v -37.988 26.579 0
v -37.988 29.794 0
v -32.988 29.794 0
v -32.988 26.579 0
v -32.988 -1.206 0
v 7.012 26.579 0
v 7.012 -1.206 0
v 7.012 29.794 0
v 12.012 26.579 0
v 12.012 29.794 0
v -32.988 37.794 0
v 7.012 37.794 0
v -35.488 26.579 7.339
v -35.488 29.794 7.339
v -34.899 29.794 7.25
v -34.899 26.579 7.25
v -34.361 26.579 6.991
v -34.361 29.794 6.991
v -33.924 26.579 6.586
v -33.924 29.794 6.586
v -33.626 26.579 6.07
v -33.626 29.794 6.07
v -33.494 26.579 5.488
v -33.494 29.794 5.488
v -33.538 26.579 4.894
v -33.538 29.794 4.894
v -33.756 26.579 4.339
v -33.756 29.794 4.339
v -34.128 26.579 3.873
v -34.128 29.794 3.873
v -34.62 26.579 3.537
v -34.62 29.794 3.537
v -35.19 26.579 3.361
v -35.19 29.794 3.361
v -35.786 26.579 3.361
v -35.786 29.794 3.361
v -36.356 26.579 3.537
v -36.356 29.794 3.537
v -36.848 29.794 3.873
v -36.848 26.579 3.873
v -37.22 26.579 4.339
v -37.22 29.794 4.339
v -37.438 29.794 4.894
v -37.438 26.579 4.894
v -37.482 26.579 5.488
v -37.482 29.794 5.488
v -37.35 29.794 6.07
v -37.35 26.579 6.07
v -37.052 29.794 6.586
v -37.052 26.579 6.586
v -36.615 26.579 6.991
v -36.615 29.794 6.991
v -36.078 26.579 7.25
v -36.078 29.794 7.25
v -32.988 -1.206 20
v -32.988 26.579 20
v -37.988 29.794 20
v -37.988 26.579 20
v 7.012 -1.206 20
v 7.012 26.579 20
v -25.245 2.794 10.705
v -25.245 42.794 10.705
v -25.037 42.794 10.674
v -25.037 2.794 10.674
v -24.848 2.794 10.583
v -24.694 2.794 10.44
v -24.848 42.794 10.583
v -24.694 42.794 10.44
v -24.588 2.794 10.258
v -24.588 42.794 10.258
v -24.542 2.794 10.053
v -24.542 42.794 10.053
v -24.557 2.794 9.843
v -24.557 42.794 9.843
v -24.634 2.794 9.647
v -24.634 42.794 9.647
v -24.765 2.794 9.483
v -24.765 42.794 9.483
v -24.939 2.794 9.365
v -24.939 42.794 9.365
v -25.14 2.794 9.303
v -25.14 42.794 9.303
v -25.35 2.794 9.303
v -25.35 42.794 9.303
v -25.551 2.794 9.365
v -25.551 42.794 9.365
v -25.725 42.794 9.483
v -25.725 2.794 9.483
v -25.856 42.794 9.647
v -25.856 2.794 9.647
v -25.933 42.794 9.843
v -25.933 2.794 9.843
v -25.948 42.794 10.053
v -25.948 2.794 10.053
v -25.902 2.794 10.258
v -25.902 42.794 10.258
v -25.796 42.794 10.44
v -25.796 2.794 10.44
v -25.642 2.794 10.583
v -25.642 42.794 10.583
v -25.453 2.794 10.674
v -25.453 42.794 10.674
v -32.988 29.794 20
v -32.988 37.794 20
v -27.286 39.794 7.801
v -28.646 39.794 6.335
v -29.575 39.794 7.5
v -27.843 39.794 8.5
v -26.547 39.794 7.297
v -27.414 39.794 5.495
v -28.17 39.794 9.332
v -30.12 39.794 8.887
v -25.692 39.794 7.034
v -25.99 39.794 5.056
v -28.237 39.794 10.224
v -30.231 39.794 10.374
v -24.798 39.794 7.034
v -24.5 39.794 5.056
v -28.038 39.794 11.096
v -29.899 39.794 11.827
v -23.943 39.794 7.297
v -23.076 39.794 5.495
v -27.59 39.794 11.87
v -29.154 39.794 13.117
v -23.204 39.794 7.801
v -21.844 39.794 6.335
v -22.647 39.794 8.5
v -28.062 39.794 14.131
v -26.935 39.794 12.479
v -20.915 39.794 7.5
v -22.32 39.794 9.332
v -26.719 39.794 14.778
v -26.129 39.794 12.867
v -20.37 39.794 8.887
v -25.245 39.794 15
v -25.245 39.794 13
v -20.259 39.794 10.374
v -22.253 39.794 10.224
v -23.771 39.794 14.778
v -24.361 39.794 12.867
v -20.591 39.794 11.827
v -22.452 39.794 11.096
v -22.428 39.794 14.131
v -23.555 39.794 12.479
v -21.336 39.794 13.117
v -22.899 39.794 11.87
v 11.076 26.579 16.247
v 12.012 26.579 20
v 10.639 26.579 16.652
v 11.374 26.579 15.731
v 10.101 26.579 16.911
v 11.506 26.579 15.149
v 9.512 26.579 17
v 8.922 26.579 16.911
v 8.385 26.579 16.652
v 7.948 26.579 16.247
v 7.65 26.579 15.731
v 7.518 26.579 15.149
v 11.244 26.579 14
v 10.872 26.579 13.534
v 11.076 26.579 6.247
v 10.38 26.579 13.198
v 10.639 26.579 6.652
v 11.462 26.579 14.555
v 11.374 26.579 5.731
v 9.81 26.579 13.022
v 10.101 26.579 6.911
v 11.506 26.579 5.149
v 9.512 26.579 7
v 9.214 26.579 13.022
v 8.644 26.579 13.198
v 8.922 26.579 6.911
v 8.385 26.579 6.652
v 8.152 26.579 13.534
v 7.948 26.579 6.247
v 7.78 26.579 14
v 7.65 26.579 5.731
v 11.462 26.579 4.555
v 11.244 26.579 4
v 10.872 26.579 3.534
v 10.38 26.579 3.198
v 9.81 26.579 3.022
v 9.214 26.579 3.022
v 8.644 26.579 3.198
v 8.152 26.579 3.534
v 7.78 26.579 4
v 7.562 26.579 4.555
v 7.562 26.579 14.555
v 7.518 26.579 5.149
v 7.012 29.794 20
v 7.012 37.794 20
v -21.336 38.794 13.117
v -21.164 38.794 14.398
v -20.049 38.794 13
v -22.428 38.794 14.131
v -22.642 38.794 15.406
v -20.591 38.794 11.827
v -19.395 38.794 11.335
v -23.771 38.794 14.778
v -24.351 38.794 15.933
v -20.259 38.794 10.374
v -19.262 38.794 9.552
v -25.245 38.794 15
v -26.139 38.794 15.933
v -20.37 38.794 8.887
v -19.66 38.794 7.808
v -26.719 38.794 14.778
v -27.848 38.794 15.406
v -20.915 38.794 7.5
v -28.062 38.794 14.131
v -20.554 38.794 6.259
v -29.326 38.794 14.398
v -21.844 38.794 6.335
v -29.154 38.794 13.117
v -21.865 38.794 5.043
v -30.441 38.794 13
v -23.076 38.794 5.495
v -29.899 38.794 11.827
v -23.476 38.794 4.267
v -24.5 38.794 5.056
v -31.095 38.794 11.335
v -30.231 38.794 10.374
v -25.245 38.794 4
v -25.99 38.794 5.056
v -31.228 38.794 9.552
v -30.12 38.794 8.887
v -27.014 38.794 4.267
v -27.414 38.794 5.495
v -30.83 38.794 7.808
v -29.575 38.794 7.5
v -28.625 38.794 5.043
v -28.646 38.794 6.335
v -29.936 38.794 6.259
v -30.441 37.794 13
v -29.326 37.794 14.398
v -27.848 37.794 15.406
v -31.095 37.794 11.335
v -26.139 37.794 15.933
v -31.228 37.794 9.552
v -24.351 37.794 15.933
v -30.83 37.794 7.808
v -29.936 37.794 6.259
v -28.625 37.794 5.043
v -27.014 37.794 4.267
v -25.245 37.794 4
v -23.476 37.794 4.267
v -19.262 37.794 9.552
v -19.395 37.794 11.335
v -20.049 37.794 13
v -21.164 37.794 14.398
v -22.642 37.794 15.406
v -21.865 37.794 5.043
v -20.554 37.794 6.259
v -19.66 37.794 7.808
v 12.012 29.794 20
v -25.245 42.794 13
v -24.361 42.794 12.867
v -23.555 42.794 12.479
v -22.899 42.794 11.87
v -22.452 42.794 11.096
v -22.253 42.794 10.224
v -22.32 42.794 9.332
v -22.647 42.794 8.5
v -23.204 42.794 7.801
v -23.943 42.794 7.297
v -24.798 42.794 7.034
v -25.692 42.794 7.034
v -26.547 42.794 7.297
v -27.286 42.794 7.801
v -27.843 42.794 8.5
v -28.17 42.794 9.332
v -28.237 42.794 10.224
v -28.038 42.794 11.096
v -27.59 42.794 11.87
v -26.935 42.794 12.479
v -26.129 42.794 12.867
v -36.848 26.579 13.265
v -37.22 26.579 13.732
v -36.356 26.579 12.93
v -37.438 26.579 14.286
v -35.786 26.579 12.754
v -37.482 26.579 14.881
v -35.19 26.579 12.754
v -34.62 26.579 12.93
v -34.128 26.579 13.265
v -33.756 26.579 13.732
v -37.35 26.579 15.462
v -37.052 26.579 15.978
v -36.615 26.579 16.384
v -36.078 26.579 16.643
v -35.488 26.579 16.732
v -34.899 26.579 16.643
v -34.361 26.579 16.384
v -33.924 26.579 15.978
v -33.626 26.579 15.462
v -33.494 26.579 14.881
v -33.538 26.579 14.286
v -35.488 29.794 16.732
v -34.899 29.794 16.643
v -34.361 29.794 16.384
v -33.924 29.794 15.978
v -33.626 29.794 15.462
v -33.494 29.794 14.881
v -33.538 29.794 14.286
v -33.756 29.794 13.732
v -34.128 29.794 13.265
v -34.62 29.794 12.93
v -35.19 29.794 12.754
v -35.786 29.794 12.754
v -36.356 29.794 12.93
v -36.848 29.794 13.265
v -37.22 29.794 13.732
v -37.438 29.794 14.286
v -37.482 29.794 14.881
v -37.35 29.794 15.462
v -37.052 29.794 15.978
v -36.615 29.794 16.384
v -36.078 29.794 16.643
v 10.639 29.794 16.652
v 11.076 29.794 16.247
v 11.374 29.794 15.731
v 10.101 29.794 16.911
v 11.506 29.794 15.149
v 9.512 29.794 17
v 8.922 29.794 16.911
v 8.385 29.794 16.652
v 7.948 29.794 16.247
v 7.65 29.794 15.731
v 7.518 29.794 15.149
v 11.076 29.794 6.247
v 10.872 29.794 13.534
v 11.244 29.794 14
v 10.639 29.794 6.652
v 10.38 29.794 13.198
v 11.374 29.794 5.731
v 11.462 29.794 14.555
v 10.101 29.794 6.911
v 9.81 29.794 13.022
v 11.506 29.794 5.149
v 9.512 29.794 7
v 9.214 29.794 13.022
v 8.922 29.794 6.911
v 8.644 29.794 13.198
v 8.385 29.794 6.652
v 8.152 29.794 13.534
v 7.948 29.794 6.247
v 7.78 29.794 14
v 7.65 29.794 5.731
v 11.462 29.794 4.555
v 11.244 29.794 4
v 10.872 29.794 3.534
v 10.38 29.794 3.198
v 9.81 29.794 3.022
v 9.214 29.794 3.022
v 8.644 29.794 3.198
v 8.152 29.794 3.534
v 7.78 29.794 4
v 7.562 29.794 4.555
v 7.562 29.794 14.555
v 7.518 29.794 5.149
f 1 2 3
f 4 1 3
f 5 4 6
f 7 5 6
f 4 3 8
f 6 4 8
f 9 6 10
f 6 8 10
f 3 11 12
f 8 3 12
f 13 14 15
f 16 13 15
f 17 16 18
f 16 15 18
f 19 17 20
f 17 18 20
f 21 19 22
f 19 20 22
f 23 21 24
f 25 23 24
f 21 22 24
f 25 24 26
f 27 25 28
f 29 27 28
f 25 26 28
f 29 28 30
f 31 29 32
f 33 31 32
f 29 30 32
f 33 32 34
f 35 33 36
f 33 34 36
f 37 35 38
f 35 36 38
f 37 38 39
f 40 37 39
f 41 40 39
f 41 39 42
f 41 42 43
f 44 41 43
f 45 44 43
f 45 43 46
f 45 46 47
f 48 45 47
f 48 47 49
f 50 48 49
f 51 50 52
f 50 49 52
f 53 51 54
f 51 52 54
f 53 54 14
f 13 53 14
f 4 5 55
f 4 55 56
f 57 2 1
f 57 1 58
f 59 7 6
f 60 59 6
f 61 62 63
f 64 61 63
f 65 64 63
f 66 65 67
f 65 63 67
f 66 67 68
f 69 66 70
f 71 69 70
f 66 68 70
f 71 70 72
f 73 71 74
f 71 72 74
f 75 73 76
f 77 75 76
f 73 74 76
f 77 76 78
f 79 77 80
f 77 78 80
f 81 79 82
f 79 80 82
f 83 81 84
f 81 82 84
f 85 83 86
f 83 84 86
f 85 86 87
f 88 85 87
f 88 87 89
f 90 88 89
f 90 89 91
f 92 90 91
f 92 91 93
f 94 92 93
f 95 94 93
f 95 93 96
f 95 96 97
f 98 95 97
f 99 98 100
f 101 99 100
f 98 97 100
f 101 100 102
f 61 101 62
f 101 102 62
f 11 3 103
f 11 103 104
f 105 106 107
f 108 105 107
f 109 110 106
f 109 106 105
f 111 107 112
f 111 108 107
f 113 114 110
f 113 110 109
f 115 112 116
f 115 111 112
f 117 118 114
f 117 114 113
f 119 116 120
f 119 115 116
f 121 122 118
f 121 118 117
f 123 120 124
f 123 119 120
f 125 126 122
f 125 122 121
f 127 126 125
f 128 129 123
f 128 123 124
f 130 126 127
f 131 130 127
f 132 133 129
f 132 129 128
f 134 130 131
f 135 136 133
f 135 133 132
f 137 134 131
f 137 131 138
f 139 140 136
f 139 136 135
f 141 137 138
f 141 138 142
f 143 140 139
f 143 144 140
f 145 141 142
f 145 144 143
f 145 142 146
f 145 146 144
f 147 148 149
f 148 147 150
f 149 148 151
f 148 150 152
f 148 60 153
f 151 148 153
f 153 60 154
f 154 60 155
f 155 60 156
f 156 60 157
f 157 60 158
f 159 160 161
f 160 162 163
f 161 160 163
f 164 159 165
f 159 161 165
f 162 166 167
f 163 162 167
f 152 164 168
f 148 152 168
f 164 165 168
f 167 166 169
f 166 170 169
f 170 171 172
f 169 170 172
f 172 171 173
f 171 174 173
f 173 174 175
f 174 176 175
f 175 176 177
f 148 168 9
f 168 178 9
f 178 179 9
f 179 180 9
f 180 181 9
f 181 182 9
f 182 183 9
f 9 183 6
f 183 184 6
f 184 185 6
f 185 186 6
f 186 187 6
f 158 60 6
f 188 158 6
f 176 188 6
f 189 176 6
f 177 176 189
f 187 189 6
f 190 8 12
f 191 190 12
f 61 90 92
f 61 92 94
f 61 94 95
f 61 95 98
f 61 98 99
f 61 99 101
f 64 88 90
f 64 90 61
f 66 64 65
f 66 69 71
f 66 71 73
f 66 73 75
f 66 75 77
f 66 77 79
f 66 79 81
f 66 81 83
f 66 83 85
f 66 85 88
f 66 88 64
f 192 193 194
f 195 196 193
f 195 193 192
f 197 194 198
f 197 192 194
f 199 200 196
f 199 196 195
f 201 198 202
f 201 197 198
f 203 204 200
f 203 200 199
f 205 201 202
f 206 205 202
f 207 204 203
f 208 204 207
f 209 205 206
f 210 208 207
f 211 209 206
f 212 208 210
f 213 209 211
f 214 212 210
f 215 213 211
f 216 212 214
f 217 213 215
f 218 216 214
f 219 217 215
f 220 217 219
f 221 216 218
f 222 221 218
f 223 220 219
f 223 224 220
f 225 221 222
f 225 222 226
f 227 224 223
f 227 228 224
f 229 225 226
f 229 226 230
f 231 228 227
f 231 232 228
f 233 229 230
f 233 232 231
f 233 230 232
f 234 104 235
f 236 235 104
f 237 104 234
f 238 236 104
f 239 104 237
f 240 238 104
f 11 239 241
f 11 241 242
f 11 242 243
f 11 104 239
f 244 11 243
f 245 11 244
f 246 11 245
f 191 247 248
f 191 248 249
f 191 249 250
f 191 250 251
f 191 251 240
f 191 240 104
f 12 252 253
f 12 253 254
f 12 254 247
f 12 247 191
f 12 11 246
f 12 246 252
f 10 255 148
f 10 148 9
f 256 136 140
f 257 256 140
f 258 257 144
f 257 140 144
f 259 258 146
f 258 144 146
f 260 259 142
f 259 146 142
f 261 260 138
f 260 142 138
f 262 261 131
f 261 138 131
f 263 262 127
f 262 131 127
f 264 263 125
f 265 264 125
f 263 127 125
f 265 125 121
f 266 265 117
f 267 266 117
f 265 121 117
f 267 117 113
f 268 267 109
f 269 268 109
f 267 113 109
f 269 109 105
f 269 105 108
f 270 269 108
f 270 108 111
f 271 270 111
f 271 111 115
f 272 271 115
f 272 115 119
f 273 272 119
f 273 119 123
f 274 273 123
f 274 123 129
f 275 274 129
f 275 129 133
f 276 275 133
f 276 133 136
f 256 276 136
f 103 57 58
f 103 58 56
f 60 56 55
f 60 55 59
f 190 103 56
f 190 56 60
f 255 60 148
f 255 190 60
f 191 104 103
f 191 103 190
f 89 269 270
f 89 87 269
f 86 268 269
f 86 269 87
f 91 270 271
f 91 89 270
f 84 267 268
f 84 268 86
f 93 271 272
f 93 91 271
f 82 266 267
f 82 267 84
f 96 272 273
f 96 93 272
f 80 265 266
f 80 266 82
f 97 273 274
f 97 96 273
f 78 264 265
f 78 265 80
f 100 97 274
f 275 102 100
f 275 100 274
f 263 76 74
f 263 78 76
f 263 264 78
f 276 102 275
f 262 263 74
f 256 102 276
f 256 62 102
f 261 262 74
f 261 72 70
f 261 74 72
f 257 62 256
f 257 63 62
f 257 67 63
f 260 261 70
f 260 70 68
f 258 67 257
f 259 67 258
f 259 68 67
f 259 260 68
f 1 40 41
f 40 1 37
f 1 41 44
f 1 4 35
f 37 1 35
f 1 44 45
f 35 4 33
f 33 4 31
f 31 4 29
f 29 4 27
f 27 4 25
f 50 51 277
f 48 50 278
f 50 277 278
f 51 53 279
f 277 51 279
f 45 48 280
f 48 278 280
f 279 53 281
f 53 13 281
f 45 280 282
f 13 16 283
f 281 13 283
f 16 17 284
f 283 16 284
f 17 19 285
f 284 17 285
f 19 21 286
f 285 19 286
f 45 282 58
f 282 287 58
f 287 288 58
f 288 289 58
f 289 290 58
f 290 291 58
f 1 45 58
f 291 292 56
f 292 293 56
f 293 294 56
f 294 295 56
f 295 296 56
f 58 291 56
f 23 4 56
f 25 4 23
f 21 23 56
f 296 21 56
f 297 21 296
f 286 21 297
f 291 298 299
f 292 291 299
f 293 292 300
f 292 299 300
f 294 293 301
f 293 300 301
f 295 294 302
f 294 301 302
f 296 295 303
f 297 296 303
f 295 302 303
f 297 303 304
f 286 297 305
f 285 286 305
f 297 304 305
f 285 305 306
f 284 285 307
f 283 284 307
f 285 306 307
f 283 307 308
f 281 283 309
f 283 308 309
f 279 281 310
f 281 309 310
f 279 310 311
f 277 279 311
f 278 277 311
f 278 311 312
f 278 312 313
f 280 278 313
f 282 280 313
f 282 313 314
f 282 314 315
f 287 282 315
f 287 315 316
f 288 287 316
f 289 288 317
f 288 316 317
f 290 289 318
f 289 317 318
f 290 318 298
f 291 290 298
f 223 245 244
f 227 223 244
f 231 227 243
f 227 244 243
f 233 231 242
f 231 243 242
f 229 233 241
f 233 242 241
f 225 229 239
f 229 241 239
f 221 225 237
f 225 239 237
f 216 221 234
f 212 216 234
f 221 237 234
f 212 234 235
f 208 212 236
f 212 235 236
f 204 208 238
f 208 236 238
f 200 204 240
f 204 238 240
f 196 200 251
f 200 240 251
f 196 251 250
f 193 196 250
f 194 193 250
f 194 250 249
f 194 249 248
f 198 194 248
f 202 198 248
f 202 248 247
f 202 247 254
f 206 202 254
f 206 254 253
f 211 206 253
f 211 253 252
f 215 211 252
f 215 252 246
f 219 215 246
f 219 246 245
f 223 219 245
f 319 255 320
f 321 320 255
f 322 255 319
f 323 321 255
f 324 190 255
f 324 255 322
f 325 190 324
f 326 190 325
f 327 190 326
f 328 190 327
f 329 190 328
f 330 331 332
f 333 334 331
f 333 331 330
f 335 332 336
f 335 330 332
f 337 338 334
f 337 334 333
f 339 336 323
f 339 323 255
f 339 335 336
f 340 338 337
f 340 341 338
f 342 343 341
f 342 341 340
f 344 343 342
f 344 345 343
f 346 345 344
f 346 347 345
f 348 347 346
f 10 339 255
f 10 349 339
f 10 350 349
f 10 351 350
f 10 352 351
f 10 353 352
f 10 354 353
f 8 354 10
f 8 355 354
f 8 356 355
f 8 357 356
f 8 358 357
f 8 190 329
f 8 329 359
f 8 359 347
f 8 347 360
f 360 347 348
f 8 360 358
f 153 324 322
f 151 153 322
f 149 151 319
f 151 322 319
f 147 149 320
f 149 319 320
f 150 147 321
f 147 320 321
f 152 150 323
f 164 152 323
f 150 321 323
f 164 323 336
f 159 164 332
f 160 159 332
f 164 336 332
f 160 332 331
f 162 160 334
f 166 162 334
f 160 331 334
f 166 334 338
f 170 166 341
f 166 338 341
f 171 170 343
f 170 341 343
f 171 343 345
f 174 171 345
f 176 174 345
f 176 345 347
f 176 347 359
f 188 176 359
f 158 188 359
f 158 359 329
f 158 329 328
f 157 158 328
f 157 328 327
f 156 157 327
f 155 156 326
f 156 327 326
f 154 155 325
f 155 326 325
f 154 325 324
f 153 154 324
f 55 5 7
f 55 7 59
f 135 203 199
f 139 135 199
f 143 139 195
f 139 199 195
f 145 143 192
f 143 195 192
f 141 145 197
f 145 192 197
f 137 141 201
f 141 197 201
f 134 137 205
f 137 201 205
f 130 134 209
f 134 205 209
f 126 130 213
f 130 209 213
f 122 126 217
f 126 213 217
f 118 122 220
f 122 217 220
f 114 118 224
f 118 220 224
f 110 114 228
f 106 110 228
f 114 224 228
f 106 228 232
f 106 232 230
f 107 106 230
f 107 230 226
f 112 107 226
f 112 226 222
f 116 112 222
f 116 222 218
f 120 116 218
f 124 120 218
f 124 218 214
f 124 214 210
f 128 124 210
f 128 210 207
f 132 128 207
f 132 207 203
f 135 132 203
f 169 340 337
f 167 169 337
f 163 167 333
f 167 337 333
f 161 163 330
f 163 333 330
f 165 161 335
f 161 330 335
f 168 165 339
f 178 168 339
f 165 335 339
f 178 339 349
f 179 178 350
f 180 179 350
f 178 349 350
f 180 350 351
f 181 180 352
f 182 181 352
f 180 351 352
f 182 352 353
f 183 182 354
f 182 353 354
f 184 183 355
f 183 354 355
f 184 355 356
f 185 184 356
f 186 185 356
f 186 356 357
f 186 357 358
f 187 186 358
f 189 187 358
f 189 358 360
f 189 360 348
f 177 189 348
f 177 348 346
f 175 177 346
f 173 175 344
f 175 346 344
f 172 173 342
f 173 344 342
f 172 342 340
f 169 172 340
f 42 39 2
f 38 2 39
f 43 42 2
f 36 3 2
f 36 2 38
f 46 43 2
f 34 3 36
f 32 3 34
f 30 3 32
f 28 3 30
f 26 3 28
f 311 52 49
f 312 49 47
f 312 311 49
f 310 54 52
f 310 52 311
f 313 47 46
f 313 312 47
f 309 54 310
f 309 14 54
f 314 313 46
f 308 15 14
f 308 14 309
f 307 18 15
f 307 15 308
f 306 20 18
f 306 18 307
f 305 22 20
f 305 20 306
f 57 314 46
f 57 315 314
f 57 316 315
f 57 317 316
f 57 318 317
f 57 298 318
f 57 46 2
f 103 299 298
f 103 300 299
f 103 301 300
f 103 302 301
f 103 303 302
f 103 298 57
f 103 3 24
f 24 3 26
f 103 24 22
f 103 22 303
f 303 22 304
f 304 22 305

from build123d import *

# Parameters (mm, degrees)
SKETCH_1_W            = 40
SKETCH_1_H            = 39
EXTRUDE_1_DEPTH       = 20
SKETCH_4_W            = 20
SKETCH_4_H            = 3.215179838
EXTRUDE_2_DEPTH       = 5
SKETCH_5_W            = 20
SKETCH_5_H            = 3.215179838
EXTRUDE_3_DEPTH       = 5
SKETCH_7_R            = 2
CUT_EXTRUDE_2_DEPTH   = 3.21517984
SKETCH_8_R            = 2
CUT_EXTRUDE_3_DEPTH   = 3.21517984
EXTRUDE_7_DEPTH       = 1
EXTRUDE_7_DEPTH_BACK  = 39
SKETCH_9_R            = 6
EXTRUDE_9_DEPTH       = 1
EXTRUDE_9_DEPTH_BACK  = 40
SKETCH_10_R           = 5
EXTRUDE_10_DEPTH      = 3
EXTRUDE_10_DEPTH_BACK = 41
SKETCH_11_R           = 3
SKETCH_12_R           = 0.705262345
CUT_EXTRUDE_4_DEPTH   = 40


with BuildPart() as part:
    # 草图1 → 凸台-拉伸1 (new body)
    with BuildSketch(Plane.XY):
        with Locations((-12.988047809, 18.294260929)):
            Rectangle(SKETCH_1_W, SKETCH_1_H)
    extrude(amount=EXTRUDE_1_DEPTH)

    # 草图4 → 凸台-拉伸2 (add)
    with BuildSketch(Plane.ZY.offset(32.988047809)):
        with Locations((10, 28.18667101)):
            Rectangle(SKETCH_4_W, SKETCH_4_H)
    extrude(amount=EXTRUDE_2_DEPTH)

    # 草图5 → 凸台-拉伸3 (add)
    with BuildSketch(Plane(origin=(7.011952191, 0, 0), x_dir=(0, 0, -1), z_dir=(1, 0, 0))):
        with Locations((-10, 28.18667101)):
            Rectangle(SKETCH_5_W, SKETCH_5_H)
    extrude(amount=EXTRUDE_3_DEPTH)

    # 草图7 → 切除-拉伸2 (cut)
    with BuildSketch(Plane(origin=(0, 29.794260929, 0), x_dir=(1, 0, 0), z_dir=(0, 1, 0))):
        with Locations(Location((-35.488047809, -5.338978439, 0), (0, 0, 270))):
            Circle(SKETCH_7_R)
        with Locations(Location((-35.488047809, -14.731505131, 0), (0, 0, 270))):
            Circle(SKETCH_7_R)
    extrude(amount=-CUT_EXTRUDE_2_DEPTH, mode=Mode.SUBTRACT)

    # 草图8 → 切除-拉伸3 (cut)
    with BuildSketch(Plane(origin=(0, 29.794260929, 0), x_dir=(1, 0, 0), z_dir=(0, 1, 0))):
        with Locations(Location((9.511952191, -5, 0), (0, 0, 270))):
            Circle(SKETCH_8_R)
        with Locations(Location((9.511952191, -15, 0), (0, 0, 270))):
            Circle(SKETCH_8_R)
    extrude(amount=-CUT_EXTRUDE_3_DEPTH, mode=Mode.SUBTRACT)

    # 草图9 → 凸台-拉伸7 (add, two sides: drawn at the far end of the back side and taken through both)
    with BuildSketch(Plane(origin=(0, 37.794260929, 0), x_dir=(1, 0, 0), z_dir=(0, 1, 0)).offset(-EXTRUDE_7_DEPTH_BACK)):
        with Locations(Location((-25.244994163, -10, 0), (0, 0, 90))):
            Circle(SKETCH_9_R)
    extrude(amount=EXTRUDE_7_DEPTH + EXTRUDE_7_DEPTH_BACK)

    # 草图10 → 凸台-拉伸9 (add, two sides: drawn at the far end of the back side and taken through both)
    with BuildSketch(Plane(origin=(0, 38.794260929, 0), x_dir=(1, 0, 0), z_dir=(0, 1, 0)).offset(-EXTRUDE_9_DEPTH_BACK)):
        with Locations(Location((-25.244994163, -10, 0), (0, 0, 270))):
            Circle(SKETCH_10_R)
    extrude(amount=EXTRUDE_9_DEPTH + EXTRUDE_9_DEPTH_BACK)

    # 草图11 → 凸台-拉伸10 (add, two sides: drawn at the far end of the back side and taken through both)
    with BuildSketch(Plane(origin=(0, 39.794260929, 0), x_dir=(1, 0, 0), z_dir=(0, 1, 0)).offset(-EXTRUDE_10_DEPTH_BACK)):
        with Locations(Location((-25.244994163, -10, 0), (0, 0, 270))):
            Circle(SKETCH_11_R)
    extrude(amount=EXTRUDE_10_DEPTH + EXTRUDE_10_DEPTH_BACK)

    # 草图12 → 切除-拉伸4 (cut)
    with BuildSketch(Plane(origin=(0, 42.794260929, 0), x_dir=(1, 0, 0), z_dir=(0, 1, 0))):
        with Locations(Location((-25.244994163, -10, 0), (0, 0, 270))):
            Circle(SKETCH_12_R)
    extrude(amount=-CUT_EXTRUDE_4_DEPTH, mode=Mode.SUBTRACT)


solid = part.part
